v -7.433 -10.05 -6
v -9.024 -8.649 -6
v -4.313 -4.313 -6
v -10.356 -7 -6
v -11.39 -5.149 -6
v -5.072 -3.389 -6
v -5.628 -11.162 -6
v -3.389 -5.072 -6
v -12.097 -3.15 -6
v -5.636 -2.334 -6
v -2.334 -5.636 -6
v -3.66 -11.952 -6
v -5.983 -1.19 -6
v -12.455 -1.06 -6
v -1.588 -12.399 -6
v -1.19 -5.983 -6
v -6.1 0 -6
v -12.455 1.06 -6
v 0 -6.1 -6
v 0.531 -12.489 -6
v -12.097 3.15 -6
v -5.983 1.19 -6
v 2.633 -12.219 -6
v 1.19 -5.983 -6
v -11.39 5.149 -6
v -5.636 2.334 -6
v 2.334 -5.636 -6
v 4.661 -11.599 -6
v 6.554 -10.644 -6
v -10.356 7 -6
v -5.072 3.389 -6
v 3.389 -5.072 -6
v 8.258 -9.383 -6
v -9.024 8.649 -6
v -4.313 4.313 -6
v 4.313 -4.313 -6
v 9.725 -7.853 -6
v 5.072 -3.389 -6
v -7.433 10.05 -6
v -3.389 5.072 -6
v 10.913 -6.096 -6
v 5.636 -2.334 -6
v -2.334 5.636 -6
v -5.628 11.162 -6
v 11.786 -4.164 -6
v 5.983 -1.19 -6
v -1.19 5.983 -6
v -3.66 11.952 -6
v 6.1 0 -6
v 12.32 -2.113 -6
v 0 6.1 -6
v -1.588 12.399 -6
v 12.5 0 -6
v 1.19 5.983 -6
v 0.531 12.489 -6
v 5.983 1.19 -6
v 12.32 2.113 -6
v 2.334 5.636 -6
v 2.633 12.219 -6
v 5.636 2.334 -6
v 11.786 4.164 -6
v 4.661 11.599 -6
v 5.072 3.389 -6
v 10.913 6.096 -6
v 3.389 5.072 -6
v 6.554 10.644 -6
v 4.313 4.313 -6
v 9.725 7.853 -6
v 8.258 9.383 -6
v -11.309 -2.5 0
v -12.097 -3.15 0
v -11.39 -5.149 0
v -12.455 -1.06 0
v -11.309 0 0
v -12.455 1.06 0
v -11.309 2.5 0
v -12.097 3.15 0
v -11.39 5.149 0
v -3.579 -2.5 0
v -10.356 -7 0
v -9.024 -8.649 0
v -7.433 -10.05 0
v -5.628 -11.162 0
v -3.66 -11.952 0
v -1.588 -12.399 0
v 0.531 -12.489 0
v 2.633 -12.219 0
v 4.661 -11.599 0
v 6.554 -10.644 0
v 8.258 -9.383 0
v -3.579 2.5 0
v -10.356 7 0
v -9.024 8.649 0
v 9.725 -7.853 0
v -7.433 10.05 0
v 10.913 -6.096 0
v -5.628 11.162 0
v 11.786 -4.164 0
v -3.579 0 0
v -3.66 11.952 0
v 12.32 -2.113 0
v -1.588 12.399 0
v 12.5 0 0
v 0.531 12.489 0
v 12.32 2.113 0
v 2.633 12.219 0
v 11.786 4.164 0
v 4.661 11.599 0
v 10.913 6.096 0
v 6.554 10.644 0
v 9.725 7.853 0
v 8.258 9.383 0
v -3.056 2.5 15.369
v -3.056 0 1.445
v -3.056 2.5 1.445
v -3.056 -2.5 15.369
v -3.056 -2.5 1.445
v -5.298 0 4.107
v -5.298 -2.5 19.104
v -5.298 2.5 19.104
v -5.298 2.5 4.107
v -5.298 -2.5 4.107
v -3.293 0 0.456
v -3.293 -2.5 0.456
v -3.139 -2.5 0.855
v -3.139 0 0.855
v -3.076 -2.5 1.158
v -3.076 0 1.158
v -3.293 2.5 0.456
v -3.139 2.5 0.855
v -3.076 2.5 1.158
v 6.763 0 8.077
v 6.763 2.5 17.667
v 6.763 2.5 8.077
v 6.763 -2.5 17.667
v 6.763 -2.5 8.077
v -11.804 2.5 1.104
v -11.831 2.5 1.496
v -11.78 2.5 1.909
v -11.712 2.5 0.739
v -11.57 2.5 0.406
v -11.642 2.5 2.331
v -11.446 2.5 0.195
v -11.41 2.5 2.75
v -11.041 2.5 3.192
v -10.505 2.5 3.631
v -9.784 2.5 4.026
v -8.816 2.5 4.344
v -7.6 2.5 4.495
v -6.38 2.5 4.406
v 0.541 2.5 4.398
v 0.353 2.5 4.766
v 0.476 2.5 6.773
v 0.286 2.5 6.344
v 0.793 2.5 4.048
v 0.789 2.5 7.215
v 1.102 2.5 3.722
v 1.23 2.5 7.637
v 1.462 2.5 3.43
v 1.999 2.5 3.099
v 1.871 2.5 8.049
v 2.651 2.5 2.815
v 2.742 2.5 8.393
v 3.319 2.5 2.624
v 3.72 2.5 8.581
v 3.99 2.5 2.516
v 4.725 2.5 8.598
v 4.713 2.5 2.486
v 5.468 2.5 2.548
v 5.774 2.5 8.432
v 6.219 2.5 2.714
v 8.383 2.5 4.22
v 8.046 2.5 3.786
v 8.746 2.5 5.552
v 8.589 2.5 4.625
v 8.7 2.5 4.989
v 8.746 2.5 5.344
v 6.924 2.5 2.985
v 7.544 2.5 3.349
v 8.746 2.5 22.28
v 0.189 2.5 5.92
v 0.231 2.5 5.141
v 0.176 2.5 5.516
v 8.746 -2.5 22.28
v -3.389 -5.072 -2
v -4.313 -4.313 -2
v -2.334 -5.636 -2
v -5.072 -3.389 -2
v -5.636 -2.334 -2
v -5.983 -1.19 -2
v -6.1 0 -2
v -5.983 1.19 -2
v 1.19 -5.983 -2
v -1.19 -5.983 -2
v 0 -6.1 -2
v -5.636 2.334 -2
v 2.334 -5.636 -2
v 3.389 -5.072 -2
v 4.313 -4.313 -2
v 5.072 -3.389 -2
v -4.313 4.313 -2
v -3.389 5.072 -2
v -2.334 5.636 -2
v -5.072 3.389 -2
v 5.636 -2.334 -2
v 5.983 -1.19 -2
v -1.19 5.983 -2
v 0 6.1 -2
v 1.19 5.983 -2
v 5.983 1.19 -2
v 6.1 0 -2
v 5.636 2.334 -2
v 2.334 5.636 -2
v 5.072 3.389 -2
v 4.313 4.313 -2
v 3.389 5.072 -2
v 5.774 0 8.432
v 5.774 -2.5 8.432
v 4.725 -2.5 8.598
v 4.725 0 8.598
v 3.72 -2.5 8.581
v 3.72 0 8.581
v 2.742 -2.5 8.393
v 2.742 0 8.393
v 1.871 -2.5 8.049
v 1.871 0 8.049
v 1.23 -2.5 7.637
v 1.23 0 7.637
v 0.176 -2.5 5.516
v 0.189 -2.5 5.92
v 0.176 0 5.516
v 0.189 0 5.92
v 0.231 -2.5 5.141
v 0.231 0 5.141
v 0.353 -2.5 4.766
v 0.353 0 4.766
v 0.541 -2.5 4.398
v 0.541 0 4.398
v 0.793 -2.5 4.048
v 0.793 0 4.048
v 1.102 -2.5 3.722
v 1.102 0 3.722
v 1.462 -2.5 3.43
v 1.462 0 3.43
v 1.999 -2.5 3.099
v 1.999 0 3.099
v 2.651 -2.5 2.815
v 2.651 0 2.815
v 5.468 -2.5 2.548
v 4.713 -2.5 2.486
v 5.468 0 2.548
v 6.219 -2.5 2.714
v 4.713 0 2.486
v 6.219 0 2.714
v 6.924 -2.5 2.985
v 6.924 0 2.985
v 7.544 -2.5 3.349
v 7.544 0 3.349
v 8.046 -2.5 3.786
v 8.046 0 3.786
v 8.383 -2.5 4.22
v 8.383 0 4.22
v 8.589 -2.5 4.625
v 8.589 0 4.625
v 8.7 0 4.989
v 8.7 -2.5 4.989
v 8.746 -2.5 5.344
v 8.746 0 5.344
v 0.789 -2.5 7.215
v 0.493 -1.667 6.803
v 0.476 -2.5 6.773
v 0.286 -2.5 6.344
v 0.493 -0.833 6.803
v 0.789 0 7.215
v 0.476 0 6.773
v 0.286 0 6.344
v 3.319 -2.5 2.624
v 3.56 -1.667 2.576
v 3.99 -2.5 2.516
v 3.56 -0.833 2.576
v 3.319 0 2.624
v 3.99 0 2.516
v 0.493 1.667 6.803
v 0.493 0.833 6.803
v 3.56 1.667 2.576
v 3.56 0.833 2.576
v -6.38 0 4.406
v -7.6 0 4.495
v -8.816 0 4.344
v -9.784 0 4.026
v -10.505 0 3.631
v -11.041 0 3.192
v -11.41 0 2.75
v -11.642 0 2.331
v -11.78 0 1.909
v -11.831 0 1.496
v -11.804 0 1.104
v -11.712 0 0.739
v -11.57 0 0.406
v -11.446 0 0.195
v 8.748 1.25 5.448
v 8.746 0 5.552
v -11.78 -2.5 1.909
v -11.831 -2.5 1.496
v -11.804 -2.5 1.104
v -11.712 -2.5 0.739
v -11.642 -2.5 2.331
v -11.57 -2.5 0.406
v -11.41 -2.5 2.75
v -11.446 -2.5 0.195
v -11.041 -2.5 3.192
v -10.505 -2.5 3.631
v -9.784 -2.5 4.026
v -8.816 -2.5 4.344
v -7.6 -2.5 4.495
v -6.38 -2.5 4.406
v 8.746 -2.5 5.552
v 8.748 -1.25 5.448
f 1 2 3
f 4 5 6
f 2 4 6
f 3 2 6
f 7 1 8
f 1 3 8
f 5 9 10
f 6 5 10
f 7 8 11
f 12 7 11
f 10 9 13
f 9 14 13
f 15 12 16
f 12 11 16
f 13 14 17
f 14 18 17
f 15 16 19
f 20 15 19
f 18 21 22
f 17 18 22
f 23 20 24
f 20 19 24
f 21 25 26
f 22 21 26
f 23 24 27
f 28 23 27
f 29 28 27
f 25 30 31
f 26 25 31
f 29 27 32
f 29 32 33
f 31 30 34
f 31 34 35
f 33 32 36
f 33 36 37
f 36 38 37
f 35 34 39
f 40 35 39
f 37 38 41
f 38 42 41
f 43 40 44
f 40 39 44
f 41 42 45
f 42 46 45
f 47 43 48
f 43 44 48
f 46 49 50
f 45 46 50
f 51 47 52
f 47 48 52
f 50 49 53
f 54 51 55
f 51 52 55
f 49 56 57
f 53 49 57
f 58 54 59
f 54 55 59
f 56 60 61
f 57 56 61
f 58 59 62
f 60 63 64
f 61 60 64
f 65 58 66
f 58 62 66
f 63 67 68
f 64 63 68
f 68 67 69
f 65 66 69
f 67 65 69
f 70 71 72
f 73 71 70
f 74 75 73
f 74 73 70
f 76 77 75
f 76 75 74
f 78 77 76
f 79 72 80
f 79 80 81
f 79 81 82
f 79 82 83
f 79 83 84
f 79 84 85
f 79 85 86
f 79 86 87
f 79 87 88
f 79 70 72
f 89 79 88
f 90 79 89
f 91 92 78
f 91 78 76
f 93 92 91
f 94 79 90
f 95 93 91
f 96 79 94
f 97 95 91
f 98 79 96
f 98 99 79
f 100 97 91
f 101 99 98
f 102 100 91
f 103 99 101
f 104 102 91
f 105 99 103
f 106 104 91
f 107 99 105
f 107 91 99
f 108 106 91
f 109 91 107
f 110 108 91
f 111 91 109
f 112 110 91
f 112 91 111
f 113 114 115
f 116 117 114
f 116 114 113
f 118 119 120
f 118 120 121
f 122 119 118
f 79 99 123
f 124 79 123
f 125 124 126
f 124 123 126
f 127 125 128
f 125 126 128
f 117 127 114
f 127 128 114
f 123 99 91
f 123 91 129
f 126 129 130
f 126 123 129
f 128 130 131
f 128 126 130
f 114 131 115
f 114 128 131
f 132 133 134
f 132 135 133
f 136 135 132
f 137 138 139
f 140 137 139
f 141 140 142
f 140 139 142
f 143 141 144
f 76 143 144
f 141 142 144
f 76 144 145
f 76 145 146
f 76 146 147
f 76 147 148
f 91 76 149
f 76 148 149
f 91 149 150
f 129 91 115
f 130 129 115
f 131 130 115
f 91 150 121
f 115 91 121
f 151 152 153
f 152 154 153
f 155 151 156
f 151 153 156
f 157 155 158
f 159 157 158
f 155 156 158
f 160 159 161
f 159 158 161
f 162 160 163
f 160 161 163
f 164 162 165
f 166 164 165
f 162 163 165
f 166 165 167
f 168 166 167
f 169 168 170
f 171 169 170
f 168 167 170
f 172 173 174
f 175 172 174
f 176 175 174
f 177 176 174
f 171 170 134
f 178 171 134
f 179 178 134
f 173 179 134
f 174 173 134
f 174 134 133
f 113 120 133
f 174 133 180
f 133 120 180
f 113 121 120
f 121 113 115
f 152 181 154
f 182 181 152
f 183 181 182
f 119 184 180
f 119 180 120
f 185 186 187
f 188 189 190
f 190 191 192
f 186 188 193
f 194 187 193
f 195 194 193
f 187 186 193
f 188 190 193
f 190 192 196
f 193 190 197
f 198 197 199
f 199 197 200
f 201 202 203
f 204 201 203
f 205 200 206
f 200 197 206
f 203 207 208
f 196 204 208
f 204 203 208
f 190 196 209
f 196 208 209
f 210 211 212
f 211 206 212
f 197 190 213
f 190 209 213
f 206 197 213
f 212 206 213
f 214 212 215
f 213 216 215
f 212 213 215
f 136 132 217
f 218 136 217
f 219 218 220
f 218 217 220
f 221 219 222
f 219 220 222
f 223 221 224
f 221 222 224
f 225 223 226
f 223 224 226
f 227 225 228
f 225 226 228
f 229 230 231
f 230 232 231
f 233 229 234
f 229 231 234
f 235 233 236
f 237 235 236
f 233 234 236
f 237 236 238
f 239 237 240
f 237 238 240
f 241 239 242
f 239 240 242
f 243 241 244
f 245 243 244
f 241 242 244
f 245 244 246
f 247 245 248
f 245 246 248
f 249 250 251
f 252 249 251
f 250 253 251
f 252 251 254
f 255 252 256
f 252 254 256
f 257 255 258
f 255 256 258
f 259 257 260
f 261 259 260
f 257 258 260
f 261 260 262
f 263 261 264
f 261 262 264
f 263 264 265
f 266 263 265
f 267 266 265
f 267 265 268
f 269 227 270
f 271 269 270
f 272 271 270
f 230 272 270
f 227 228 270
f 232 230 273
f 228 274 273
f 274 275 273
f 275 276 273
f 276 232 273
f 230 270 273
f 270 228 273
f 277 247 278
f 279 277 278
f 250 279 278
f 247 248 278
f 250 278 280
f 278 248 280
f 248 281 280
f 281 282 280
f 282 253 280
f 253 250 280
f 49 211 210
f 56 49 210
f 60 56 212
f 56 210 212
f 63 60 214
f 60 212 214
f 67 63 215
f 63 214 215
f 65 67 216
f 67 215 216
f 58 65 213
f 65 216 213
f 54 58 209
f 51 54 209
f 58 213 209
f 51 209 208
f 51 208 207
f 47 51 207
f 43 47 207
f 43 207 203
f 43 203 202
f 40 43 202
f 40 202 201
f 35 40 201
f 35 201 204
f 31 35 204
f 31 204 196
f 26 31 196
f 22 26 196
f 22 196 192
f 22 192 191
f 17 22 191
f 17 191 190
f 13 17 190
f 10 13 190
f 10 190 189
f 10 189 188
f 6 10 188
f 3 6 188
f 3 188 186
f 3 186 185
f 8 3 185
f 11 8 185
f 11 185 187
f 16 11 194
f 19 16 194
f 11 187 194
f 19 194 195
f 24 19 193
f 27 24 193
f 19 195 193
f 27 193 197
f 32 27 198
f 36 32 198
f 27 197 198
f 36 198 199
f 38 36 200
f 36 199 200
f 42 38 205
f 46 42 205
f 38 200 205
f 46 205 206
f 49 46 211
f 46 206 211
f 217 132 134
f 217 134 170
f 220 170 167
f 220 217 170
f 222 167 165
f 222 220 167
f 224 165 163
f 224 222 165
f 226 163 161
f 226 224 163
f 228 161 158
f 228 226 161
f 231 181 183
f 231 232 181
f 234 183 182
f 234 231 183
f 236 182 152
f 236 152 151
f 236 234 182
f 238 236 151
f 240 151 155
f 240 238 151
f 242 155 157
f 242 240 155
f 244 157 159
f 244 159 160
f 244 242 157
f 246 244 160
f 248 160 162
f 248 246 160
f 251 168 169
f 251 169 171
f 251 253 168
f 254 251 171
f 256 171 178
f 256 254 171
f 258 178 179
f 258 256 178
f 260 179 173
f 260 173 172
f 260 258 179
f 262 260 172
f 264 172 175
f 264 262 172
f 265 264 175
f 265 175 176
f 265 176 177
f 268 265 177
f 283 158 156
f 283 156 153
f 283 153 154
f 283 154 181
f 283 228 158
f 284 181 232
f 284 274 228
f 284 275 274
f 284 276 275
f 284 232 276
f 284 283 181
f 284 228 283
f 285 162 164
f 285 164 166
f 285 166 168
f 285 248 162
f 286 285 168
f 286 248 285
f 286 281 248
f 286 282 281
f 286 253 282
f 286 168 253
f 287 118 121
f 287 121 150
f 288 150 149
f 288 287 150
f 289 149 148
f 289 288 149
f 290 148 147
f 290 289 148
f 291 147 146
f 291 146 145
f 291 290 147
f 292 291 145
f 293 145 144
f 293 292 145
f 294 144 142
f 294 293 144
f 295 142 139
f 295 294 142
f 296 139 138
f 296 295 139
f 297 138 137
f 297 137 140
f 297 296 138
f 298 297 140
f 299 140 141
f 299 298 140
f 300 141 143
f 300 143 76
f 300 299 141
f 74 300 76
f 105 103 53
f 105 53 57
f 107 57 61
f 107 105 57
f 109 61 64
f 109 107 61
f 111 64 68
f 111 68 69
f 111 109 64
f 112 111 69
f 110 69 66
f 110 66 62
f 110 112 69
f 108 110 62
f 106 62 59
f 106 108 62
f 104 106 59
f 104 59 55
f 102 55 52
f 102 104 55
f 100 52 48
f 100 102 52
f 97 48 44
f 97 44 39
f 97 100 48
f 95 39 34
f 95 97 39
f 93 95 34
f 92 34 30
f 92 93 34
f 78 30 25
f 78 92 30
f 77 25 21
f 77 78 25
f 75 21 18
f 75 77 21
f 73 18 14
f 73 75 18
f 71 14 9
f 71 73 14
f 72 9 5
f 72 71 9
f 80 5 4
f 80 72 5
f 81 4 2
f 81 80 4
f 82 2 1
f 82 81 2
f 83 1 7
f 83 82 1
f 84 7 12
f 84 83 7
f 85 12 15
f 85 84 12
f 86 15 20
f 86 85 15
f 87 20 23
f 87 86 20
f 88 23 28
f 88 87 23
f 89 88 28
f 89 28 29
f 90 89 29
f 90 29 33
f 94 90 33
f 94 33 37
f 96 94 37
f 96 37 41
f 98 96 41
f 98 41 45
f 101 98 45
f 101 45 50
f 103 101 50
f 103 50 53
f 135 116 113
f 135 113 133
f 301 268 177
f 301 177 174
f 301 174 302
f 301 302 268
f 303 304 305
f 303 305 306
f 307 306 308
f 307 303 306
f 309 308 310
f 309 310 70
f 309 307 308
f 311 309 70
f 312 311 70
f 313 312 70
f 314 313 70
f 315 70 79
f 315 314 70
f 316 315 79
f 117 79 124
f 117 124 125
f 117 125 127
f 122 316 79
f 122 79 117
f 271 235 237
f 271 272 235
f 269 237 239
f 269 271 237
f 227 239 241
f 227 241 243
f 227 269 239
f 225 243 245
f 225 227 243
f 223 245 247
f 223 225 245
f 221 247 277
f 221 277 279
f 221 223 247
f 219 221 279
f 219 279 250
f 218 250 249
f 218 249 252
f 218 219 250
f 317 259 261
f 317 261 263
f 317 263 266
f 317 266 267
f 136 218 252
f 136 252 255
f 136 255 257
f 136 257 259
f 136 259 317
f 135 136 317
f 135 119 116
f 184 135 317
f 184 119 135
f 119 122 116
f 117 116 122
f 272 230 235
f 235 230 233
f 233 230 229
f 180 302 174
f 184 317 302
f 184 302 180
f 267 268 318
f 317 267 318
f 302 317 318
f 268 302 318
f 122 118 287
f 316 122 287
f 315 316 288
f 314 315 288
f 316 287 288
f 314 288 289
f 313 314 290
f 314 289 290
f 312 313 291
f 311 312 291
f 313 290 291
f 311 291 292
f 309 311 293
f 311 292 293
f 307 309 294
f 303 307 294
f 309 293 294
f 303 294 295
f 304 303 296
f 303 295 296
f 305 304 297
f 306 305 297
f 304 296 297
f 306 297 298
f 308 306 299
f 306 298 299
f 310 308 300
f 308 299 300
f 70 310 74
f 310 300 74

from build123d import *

# Parameters (mm, degrees)
F0_R     = 12.5
F0_R_2   = 6.1
F1_DEPTH = 6
F2_DEPTH = 2
F4_DEPTH = 2.5


with BuildPart() as f1:
    # F0 (on Top) → F1 (new body)
    with BuildSketch(Plane.XY):
        Circle(F0_R)
        Circle(F0_R_2, mode=Mode.SUBTRACT)
    extrude(amount=-F1_DEPTH)

    # F0 (on Top) → F2 (join)
    with BuildSketch(Plane.XY):
        Circle(F0_R_2)
    extrude(amount=-F2_DEPTH)

    # F3 (on Front) → F4 (join, symmetric)
    with BuildSketch(Plane.XZ):
        with BuildLine():
            add(Edge.make_bspline(
                [(8.745821, 5.343975), (8.750764, 5.447785), (8.745821, 5.551827)],
                knots=[0, 0, 0, 0.067901, 0.067901, 0.067901], degree=2, weights=[1, 0.999424, 1]))
            Line((8.745821, 5.551827), (8.745821, 5.343975))
        make_face()
        with BuildLine():
            add(Edge.make_bspline(
                [(-3.056437, 1.444817), (-3.056437, 3.232295), (-5.297712, 4.106672)],
                knots=[0, 0, 0, 1.059661, 1.059661, 1.059661], degree=2, weights=[1, 0.862893, 1]))
            add(Edge.make_bspline(
                [(-5.297712, 4.106672), (-19.40331, 9.609614), (-11.229873, -0.097585), (-3.056437, -9.804784), (-3.056437, 1.444817)],
                knots=[1.059661, 1.059661, 1.059661, 3.671423, 3.671423, 6.283185, 6.283185, 6.283185], degree=2, weights=[1, 0.261827, 1, 0.261827, 1]))
        make_face()
        with BuildLine():
            Line((8.745821, 5.343975), (8.745821, 5.551827))
            add(Edge.make_bspline(
                [(8.745821, 5.551827), (8.669129, 7.165933), (6.763276, 8.076893)],
                knots=[0.067901, 0.067901, 0.067901, 1.037788, 1.037788, 1.037788], degree=2, weights=[1, 0.884701, 1]))
            add(Edge.make_bspline(
                [(6.763276, 8.076893), (2.438907, 10.143854), (0.493255, 6.802759), (-1.452398, 3.461665), (3.559705, 2.575689), (8.571808, 1.689712), (8.745821, 5.343975)],
                knots=[1.037788, 1.037788, 1.037788, 2.786254, 2.786254, 4.53472, 4.53472, 6.283185, 6.283185, 6.283185], degree=2, weights=[1, 0.641585, 1, 0.641585, 1, 0.641585, 1]))
        make_face()
        with BuildLine():
            Line((8.745821, 22.28014), (-5.297712, 19.104175))
            Line((-5.297712, 19.104175), (-5.297712, 4.106672))
            add(Edge.make_bspline(
                [(-3.056437, 1.444817), (-3.056437, 3.232295), (-5.297712, 4.106672)],
                knots=[0, 0, 0, 1.059661, 1.059661, 1.059661], degree=2, weights=[1, 0.862893, 1]))
            Line((-3.056437, 1.444817), (-3.056437, 15.368507))
            Line((-3.056437, 15.368507), (6.763276, 17.666737))
            Line((6.763276, 17.666737), (6.763276, 8.076893))
            add(Edge.make_bspline(
                [(8.745821, 5.551827), (8.669129, 7.165933), (6.763276, 8.076893)],
                knots=[0.067901, 0.067901, 0.067901, 1.037788, 1.037788, 1.037788], degree=2, weights=[1, 0.884701, 1]))
            Line((8.745821, 5.551827), (8.745821, 22.28014))
        make_face()
    extrude(amount=F4_DEPTH, both=True)


solid = f1.part
